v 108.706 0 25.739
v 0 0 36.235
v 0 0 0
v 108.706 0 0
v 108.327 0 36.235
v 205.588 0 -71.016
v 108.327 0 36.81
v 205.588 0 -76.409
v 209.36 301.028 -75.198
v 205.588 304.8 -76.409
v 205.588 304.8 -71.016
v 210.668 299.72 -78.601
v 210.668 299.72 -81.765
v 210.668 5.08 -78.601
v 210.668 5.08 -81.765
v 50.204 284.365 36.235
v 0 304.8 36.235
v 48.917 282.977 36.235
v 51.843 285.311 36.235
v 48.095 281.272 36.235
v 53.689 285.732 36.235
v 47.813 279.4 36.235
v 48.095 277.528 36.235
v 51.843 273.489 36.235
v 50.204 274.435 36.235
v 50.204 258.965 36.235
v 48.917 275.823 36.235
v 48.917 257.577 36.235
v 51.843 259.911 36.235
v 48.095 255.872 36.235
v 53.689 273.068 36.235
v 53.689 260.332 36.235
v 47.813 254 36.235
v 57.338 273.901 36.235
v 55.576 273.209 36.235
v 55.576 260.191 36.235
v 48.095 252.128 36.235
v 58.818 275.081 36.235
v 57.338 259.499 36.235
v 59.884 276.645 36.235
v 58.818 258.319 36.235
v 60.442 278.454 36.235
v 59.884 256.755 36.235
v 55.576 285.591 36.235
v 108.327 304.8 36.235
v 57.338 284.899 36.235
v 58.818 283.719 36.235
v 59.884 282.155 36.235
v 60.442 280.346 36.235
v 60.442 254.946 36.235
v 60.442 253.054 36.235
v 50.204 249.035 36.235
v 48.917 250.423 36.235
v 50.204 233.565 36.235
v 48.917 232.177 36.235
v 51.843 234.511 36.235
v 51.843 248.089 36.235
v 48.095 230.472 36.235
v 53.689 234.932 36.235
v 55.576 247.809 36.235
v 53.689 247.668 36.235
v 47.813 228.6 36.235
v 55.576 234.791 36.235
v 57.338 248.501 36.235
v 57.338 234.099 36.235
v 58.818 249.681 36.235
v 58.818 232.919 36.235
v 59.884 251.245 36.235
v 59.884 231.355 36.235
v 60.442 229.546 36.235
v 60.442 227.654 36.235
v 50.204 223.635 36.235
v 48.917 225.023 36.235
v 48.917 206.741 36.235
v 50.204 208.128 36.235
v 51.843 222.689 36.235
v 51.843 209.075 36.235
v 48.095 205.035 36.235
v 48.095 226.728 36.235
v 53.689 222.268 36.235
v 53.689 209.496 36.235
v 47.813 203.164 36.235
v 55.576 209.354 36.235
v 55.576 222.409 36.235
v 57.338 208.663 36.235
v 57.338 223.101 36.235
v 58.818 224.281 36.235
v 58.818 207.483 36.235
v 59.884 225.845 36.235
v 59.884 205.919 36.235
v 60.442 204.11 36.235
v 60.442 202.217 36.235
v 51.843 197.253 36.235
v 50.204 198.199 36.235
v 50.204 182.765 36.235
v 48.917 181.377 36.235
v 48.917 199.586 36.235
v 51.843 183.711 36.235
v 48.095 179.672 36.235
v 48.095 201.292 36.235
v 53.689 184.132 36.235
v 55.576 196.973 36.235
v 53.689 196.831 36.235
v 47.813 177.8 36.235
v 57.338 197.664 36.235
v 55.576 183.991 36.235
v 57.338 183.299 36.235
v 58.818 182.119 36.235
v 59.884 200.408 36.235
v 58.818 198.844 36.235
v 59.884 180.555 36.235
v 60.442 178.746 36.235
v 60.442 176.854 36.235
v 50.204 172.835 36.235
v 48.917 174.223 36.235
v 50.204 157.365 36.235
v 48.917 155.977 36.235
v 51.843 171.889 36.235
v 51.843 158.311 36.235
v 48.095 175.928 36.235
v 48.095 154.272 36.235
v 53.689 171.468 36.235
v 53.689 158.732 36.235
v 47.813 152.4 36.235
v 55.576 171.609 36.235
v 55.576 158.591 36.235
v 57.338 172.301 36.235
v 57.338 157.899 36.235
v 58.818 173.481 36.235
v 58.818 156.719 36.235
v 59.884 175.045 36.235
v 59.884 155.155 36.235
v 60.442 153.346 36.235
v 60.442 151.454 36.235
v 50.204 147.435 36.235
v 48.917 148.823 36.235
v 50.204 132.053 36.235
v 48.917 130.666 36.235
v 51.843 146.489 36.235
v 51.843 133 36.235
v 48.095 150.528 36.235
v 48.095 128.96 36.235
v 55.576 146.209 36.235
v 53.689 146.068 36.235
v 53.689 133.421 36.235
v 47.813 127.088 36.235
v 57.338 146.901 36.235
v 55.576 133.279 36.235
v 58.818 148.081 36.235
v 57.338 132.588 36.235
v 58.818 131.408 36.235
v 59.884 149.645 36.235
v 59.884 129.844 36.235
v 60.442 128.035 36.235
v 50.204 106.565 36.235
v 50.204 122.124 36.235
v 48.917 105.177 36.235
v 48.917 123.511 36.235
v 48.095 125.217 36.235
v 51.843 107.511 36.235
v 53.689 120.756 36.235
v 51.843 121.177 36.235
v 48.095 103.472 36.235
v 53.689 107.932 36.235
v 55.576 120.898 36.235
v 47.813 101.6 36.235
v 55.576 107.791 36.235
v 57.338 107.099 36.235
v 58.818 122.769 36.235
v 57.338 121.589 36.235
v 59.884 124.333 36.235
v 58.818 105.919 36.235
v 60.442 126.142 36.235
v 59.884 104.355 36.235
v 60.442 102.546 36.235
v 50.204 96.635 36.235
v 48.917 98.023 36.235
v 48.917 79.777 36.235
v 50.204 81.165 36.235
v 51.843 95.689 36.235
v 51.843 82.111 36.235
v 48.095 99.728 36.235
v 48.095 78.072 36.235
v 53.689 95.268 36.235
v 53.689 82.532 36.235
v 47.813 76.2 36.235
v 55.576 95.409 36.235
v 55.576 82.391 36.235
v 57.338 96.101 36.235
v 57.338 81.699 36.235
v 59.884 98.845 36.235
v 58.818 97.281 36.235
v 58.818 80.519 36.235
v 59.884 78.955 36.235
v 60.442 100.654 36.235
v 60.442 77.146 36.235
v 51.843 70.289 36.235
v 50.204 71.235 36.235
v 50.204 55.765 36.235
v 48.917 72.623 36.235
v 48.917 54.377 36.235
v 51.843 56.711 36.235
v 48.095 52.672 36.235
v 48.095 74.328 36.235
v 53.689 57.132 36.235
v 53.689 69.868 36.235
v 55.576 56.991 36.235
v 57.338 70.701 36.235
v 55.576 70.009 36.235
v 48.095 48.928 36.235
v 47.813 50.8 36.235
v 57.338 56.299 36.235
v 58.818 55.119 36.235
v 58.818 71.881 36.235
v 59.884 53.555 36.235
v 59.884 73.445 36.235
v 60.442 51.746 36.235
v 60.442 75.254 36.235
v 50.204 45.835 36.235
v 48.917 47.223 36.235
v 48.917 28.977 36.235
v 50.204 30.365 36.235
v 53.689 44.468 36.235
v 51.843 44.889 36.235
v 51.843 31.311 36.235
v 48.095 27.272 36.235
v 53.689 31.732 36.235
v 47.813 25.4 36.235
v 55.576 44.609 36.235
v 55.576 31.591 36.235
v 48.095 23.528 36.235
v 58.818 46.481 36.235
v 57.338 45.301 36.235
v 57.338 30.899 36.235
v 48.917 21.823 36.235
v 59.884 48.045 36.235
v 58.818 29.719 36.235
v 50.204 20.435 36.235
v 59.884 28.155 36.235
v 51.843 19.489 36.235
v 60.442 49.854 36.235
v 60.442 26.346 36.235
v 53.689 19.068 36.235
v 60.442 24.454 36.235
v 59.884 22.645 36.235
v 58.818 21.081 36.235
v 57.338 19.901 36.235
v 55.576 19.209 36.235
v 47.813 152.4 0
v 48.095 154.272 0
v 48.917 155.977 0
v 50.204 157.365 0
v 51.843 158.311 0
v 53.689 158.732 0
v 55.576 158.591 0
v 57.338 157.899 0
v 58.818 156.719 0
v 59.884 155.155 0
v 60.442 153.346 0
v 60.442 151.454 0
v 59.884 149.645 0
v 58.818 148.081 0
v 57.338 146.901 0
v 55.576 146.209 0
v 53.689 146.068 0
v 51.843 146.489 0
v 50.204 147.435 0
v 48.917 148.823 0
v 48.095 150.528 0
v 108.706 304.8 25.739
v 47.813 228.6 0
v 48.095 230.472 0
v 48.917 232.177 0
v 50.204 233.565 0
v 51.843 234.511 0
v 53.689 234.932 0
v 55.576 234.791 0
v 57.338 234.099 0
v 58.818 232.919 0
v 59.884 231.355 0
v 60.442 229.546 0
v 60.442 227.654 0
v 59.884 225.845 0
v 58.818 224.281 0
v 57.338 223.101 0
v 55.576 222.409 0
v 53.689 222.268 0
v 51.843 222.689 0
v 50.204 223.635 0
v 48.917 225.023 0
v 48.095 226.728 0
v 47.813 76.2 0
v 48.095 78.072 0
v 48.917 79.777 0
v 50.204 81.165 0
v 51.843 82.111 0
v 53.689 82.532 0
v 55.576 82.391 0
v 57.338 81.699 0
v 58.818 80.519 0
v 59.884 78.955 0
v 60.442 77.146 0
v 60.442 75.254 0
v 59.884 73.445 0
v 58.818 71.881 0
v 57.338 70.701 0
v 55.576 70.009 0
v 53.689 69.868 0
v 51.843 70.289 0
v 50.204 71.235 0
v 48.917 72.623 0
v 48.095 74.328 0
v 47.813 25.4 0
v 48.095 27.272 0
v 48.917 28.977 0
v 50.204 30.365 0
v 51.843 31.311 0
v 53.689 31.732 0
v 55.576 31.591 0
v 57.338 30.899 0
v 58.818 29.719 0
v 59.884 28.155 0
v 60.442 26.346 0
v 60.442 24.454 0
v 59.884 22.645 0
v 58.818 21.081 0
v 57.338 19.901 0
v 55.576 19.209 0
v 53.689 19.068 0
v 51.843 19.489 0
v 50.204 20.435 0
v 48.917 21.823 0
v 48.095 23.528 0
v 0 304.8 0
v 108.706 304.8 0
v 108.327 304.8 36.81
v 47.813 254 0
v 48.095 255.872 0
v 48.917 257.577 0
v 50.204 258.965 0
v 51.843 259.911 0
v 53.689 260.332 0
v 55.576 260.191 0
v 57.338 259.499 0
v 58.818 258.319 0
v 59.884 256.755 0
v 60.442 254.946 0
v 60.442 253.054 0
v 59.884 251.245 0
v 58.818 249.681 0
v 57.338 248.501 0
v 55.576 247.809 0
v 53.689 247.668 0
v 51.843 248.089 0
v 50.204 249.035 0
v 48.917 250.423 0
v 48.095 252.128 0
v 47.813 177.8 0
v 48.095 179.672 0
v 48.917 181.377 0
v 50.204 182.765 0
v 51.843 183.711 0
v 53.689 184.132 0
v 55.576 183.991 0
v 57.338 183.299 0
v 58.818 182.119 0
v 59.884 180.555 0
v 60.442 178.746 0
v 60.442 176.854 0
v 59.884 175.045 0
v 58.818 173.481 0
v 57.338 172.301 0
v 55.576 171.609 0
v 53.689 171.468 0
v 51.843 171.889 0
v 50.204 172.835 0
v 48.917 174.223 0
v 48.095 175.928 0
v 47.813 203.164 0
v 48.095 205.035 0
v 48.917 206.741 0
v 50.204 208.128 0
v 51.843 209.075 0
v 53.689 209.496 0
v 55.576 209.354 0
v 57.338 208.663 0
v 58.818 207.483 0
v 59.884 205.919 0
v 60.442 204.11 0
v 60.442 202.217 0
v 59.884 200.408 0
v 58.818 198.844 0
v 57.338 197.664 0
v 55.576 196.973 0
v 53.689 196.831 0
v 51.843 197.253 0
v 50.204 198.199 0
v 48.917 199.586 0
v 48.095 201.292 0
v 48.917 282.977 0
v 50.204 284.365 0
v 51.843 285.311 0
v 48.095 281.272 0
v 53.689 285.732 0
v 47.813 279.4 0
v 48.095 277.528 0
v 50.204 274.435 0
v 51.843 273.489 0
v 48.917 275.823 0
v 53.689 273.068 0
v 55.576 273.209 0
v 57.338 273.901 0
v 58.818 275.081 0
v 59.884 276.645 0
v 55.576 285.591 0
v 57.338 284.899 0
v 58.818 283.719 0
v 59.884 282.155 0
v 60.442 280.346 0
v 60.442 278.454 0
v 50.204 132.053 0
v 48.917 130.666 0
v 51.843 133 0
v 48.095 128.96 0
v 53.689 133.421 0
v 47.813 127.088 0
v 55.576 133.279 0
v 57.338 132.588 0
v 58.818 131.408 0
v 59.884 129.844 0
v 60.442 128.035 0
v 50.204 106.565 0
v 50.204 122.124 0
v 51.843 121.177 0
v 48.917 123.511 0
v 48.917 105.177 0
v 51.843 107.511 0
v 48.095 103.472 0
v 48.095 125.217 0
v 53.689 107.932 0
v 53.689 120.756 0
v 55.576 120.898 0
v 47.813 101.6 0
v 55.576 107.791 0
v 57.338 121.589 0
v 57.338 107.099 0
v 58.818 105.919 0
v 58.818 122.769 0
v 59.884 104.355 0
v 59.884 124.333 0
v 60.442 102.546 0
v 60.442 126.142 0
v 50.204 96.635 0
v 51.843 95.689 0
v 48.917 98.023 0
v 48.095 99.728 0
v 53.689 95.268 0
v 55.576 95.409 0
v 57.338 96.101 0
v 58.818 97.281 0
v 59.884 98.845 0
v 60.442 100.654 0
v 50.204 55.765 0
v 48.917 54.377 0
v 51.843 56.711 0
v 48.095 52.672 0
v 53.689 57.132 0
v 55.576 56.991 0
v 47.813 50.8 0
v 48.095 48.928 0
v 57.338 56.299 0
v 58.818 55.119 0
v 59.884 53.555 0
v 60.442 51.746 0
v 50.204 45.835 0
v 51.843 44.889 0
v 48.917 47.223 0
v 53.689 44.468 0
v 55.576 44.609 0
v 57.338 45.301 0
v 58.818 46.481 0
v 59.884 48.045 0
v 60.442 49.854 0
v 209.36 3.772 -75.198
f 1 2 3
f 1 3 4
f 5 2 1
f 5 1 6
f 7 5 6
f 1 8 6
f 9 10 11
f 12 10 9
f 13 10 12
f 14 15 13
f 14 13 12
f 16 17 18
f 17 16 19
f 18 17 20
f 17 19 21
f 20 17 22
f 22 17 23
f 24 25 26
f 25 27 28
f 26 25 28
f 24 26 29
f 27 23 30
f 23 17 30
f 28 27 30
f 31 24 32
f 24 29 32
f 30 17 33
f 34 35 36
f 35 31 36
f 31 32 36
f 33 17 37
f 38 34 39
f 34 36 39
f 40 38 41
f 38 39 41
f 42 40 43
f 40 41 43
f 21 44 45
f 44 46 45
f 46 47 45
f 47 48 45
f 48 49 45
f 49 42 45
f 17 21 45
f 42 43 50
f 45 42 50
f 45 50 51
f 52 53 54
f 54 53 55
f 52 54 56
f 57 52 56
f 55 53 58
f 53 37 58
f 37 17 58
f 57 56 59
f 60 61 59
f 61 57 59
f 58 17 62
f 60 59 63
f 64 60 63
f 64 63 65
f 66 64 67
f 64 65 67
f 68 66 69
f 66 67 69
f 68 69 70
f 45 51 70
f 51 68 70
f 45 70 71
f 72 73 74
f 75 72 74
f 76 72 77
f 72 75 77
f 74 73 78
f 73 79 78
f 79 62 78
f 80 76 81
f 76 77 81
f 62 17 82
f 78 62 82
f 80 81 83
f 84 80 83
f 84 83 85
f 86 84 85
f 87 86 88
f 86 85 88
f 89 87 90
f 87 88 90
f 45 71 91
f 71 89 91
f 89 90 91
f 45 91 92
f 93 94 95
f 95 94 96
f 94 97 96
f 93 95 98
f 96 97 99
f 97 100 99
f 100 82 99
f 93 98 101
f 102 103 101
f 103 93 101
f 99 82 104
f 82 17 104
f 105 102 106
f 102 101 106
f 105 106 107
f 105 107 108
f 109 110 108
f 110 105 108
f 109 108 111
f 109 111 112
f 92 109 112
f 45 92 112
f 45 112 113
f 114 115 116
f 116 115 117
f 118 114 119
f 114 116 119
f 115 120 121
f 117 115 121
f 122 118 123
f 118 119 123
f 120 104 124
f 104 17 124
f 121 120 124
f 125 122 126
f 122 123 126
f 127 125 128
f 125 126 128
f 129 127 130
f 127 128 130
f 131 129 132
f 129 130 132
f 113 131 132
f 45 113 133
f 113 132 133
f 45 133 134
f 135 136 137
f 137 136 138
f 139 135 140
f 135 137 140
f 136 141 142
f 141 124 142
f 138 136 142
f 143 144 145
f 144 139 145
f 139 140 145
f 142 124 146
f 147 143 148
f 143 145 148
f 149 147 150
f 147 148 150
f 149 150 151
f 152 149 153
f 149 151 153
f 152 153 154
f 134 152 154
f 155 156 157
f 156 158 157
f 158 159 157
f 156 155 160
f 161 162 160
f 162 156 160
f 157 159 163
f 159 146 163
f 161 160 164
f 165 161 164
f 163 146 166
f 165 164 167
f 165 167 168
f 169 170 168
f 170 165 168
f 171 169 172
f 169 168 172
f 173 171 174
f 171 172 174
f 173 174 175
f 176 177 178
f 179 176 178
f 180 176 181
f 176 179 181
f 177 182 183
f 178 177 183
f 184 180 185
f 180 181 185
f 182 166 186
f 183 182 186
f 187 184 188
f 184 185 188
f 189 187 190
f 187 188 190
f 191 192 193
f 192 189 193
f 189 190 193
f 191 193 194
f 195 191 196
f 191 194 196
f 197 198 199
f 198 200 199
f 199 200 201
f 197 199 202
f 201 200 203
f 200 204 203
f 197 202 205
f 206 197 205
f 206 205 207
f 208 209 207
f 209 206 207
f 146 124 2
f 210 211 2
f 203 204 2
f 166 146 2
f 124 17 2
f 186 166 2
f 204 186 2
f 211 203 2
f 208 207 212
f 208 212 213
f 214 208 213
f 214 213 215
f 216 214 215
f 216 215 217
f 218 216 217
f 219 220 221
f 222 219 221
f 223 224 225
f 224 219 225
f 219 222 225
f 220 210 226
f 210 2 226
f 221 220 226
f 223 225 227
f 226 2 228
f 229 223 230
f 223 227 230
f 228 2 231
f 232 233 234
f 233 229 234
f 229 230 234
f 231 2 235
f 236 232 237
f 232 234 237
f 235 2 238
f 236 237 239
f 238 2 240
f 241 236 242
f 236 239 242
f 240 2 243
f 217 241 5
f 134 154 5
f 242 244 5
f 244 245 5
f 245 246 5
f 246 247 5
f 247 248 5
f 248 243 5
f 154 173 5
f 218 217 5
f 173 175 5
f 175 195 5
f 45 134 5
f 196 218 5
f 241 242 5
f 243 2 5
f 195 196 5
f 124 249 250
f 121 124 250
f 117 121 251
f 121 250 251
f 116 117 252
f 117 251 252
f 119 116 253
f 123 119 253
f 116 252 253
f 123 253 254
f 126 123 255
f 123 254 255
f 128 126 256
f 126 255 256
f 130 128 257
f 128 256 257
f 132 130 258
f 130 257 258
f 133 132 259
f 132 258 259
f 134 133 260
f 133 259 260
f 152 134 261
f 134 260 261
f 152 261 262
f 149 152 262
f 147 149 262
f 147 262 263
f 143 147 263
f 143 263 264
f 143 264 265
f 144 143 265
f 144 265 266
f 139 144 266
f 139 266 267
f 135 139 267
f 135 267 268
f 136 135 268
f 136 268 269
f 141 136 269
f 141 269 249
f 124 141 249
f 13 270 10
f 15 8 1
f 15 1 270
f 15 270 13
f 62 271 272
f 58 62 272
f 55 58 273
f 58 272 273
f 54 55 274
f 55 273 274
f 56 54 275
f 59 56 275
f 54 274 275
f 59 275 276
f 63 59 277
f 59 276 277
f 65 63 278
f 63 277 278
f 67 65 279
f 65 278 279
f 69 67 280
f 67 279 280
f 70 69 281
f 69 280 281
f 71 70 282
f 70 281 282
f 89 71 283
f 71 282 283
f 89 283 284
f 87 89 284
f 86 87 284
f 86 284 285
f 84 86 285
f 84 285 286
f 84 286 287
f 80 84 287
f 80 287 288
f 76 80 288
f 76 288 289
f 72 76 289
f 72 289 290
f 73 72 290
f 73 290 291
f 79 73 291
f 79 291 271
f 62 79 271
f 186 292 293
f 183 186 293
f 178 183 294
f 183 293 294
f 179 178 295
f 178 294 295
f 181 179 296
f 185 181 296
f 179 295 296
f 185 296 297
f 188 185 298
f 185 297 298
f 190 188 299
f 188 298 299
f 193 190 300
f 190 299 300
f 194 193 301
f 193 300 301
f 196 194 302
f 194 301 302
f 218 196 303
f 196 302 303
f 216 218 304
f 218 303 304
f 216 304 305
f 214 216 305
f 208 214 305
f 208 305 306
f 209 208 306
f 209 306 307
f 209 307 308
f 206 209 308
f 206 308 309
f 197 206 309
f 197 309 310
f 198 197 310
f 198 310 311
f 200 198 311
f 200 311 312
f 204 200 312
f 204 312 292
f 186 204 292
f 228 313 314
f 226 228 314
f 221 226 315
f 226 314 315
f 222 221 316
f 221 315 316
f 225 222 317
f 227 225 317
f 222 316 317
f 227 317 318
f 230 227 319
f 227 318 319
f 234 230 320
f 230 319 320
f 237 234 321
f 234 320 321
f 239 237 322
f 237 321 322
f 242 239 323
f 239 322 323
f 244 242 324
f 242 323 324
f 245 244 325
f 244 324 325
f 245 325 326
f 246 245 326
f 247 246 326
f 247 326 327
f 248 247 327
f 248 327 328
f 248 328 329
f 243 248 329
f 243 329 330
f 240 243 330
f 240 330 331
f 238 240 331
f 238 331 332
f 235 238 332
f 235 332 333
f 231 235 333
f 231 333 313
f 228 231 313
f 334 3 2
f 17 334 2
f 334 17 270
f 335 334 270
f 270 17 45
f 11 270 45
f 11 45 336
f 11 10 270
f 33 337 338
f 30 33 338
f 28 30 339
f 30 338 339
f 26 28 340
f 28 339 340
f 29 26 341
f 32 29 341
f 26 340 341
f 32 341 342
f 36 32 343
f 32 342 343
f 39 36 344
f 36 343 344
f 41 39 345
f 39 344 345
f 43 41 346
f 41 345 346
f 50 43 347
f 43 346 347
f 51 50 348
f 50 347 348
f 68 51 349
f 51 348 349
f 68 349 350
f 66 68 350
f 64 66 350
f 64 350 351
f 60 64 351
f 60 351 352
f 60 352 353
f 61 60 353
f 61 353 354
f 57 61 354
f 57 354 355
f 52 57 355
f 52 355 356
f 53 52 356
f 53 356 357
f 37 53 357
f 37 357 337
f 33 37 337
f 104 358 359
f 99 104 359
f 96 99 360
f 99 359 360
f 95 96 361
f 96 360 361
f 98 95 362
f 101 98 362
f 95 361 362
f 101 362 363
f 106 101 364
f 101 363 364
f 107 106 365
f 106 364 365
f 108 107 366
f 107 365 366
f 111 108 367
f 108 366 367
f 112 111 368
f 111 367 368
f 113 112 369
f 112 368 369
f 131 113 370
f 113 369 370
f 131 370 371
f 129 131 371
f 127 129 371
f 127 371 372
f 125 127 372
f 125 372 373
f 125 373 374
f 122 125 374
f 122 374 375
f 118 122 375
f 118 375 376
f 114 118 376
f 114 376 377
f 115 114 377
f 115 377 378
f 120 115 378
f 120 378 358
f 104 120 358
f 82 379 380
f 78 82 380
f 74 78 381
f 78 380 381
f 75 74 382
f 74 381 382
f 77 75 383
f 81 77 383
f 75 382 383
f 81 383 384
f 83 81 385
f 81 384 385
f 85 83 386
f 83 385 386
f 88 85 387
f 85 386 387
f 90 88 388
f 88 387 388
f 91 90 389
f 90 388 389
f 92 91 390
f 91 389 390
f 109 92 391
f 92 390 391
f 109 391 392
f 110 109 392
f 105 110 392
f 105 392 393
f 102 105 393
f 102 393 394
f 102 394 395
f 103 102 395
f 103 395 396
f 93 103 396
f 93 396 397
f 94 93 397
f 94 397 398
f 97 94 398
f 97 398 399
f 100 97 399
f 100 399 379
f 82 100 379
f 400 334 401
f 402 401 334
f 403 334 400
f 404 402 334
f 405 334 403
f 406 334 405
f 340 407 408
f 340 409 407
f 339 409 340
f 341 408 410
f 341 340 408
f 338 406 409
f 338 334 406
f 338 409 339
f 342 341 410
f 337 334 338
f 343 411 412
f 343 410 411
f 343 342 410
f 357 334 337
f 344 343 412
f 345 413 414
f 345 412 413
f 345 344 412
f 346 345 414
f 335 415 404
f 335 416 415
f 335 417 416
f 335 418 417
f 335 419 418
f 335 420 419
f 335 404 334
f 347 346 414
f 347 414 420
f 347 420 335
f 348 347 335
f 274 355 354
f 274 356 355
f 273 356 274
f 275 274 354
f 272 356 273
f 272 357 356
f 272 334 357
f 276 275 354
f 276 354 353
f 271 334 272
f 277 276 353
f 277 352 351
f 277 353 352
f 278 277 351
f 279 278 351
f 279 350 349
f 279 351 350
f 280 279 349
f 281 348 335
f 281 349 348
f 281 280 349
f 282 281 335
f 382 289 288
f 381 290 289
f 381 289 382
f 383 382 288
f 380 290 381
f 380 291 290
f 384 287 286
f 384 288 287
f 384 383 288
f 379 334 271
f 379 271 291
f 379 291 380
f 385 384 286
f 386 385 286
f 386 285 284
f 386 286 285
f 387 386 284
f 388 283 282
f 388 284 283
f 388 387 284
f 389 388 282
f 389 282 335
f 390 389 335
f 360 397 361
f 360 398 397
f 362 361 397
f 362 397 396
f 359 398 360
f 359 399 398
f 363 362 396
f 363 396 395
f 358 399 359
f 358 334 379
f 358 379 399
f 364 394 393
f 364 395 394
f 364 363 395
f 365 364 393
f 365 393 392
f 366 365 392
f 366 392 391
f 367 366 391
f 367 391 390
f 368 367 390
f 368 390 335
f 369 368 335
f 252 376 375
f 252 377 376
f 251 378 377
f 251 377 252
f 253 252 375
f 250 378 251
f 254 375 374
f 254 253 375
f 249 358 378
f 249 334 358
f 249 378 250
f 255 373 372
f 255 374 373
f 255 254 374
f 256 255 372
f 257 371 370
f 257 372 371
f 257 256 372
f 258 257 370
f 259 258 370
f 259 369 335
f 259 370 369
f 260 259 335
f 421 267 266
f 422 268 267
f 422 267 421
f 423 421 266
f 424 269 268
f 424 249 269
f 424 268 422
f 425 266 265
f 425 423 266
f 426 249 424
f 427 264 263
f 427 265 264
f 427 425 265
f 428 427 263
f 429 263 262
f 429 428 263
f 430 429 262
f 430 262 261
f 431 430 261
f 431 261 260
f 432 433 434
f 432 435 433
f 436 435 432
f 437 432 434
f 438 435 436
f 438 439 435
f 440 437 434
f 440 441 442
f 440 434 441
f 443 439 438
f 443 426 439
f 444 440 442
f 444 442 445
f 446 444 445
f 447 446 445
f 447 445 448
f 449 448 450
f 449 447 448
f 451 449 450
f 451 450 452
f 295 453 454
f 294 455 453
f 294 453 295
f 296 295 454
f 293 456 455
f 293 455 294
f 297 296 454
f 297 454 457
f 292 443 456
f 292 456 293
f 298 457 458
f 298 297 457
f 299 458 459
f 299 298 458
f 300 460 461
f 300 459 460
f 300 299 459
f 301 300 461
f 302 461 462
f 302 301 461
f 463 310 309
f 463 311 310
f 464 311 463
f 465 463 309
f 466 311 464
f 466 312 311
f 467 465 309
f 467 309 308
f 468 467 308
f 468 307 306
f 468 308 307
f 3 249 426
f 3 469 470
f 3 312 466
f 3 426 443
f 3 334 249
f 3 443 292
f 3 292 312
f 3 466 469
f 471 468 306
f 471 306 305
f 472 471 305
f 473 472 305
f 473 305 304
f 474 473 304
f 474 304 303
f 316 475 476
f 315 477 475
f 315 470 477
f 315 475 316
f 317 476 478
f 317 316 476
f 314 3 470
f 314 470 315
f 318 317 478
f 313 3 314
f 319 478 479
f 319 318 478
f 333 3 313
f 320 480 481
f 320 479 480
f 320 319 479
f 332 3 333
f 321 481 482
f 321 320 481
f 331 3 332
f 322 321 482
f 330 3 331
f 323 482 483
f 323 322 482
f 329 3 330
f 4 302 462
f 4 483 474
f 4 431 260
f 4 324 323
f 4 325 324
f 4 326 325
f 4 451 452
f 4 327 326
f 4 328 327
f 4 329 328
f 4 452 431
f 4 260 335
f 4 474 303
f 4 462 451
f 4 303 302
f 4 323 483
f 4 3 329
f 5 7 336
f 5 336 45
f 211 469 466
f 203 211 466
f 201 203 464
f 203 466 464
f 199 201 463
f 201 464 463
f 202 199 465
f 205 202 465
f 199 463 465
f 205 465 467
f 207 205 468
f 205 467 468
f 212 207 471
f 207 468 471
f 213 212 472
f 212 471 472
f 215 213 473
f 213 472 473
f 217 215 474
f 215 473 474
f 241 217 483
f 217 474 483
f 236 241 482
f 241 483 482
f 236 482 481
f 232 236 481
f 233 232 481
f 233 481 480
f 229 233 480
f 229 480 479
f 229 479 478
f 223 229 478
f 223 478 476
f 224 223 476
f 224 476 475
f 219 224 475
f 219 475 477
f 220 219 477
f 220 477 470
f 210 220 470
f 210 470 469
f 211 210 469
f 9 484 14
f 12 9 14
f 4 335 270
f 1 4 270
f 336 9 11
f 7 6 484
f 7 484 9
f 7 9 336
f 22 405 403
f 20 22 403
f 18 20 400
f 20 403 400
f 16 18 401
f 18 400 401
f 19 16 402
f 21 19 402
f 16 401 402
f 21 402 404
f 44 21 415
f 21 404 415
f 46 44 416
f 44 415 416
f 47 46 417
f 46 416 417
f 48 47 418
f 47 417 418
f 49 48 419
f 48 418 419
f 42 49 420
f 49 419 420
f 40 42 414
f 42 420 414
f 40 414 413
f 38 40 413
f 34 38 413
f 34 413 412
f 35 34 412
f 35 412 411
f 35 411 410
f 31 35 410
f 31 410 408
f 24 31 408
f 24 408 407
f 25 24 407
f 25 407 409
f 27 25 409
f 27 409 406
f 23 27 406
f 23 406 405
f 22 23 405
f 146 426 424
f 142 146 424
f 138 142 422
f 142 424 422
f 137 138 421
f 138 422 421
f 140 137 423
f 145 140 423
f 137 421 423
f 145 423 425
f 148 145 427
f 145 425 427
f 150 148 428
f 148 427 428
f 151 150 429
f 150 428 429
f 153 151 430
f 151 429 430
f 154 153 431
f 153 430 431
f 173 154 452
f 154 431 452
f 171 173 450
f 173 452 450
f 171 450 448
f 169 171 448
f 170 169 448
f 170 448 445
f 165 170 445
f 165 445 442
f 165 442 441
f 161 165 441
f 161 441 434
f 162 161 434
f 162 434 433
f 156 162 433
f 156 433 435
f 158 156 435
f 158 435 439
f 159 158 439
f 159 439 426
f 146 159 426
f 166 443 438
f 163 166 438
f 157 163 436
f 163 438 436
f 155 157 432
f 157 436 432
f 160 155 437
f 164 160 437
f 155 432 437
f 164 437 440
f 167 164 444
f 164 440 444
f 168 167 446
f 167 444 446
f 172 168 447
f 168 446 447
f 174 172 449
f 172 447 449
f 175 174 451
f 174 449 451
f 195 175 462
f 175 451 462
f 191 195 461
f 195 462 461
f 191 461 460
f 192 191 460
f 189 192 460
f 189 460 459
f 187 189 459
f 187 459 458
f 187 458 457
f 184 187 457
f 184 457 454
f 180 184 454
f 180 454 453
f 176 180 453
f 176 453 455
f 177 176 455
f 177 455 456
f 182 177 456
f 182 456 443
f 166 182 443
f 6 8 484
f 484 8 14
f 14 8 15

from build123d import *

# Parameters (mm, degrees)
F0_W        = 108.7058566231
F0_H        = 36.235285541
F1_DEPTH    = 304.8
F3_DEPTH    = 304.8
F4_T1_DEPTH = 31.2448363711
F4_T3_DEPTH = 315.5177056065
F6_D        = 12.7


# Not quite as in the source:
# - a fillet or chamfer that OpenCascade refuses, or shapes differently, is made with other operations: its cross-section is extruded or revolved along the edge and cut away or added
# - a feature names something its author has since deleted; it is built from what else it names


with BuildPart() as f1:
    # F0 (on Front) → F1 (new body)
    with BuildSketch(Plane.XZ):
        with Locations((54.3529283115, 18.1176427705)):
            Rectangle(F0_W, F0_H)
    extrude(amount=-F1_DEPTH)

    # F2 (on face) → F3 (join)
    with BuildSketch(Plane.XZ):
        Polygon((210.6682882407, -76.6480192542), (108.3266659877, 36.8101285866), (108.3266659877, 36.235285541), (108.7058566231, 36.235285541), (108.7058566231, 25.7386137456), (210.6682882407, -81.7645564675), align=None)
    extrude(amount=-F3_DEPTH)

    # F4: chamfer of 5.08 on 3 edges, made by hand

    # F4_s2 → F4_t1 (cut)
    with BuildSketch(Plane.XY.offset(-94.8287060464)):
        Polygon((205.5882882407, 0), (210.6682882407, 5.08), (210.6682882407, 0), align=None)
        Polygon((205.5882882407, 304.8), (210.6682882407, 299.72), (210.6682882407, 304.8), align=None)
    extrude(amount=F4_T1_DEPTH, mode=Mode.SUBTRACT)

    # F4_s4 → F4_t3 (cut)
    with BuildSketch(Plane.XZ.offset(-310.1588528033)):
        Polygon((209.3604296259, -75.1980987546), (210.6682882407, -78.6006491759), (210.6682882407, -76.6480192542), align=None)
    extrude(amount=F4_T3_DEPTH, mode=Mode.SUBTRACT)

    # F6 (through all)
    with Locations(Plane.XY.offset(36.235285541)):
        with Locations((54.1633329939, 228.6), (54.1633329939, 152.4), (54.1633329939, 279.4), (54.1633329939, 254), (54.1633329939, 177.8), (54.1633329939, 203.1635642052), (54.1633329939, 127.0884871483), (54.1633329939, 101.6), (54.1633329939, 50.8), (54.1633329939, 25.4), (54.1633329939, 76.2)):
            Hole(F6_D / 2)


solid = f1.part
